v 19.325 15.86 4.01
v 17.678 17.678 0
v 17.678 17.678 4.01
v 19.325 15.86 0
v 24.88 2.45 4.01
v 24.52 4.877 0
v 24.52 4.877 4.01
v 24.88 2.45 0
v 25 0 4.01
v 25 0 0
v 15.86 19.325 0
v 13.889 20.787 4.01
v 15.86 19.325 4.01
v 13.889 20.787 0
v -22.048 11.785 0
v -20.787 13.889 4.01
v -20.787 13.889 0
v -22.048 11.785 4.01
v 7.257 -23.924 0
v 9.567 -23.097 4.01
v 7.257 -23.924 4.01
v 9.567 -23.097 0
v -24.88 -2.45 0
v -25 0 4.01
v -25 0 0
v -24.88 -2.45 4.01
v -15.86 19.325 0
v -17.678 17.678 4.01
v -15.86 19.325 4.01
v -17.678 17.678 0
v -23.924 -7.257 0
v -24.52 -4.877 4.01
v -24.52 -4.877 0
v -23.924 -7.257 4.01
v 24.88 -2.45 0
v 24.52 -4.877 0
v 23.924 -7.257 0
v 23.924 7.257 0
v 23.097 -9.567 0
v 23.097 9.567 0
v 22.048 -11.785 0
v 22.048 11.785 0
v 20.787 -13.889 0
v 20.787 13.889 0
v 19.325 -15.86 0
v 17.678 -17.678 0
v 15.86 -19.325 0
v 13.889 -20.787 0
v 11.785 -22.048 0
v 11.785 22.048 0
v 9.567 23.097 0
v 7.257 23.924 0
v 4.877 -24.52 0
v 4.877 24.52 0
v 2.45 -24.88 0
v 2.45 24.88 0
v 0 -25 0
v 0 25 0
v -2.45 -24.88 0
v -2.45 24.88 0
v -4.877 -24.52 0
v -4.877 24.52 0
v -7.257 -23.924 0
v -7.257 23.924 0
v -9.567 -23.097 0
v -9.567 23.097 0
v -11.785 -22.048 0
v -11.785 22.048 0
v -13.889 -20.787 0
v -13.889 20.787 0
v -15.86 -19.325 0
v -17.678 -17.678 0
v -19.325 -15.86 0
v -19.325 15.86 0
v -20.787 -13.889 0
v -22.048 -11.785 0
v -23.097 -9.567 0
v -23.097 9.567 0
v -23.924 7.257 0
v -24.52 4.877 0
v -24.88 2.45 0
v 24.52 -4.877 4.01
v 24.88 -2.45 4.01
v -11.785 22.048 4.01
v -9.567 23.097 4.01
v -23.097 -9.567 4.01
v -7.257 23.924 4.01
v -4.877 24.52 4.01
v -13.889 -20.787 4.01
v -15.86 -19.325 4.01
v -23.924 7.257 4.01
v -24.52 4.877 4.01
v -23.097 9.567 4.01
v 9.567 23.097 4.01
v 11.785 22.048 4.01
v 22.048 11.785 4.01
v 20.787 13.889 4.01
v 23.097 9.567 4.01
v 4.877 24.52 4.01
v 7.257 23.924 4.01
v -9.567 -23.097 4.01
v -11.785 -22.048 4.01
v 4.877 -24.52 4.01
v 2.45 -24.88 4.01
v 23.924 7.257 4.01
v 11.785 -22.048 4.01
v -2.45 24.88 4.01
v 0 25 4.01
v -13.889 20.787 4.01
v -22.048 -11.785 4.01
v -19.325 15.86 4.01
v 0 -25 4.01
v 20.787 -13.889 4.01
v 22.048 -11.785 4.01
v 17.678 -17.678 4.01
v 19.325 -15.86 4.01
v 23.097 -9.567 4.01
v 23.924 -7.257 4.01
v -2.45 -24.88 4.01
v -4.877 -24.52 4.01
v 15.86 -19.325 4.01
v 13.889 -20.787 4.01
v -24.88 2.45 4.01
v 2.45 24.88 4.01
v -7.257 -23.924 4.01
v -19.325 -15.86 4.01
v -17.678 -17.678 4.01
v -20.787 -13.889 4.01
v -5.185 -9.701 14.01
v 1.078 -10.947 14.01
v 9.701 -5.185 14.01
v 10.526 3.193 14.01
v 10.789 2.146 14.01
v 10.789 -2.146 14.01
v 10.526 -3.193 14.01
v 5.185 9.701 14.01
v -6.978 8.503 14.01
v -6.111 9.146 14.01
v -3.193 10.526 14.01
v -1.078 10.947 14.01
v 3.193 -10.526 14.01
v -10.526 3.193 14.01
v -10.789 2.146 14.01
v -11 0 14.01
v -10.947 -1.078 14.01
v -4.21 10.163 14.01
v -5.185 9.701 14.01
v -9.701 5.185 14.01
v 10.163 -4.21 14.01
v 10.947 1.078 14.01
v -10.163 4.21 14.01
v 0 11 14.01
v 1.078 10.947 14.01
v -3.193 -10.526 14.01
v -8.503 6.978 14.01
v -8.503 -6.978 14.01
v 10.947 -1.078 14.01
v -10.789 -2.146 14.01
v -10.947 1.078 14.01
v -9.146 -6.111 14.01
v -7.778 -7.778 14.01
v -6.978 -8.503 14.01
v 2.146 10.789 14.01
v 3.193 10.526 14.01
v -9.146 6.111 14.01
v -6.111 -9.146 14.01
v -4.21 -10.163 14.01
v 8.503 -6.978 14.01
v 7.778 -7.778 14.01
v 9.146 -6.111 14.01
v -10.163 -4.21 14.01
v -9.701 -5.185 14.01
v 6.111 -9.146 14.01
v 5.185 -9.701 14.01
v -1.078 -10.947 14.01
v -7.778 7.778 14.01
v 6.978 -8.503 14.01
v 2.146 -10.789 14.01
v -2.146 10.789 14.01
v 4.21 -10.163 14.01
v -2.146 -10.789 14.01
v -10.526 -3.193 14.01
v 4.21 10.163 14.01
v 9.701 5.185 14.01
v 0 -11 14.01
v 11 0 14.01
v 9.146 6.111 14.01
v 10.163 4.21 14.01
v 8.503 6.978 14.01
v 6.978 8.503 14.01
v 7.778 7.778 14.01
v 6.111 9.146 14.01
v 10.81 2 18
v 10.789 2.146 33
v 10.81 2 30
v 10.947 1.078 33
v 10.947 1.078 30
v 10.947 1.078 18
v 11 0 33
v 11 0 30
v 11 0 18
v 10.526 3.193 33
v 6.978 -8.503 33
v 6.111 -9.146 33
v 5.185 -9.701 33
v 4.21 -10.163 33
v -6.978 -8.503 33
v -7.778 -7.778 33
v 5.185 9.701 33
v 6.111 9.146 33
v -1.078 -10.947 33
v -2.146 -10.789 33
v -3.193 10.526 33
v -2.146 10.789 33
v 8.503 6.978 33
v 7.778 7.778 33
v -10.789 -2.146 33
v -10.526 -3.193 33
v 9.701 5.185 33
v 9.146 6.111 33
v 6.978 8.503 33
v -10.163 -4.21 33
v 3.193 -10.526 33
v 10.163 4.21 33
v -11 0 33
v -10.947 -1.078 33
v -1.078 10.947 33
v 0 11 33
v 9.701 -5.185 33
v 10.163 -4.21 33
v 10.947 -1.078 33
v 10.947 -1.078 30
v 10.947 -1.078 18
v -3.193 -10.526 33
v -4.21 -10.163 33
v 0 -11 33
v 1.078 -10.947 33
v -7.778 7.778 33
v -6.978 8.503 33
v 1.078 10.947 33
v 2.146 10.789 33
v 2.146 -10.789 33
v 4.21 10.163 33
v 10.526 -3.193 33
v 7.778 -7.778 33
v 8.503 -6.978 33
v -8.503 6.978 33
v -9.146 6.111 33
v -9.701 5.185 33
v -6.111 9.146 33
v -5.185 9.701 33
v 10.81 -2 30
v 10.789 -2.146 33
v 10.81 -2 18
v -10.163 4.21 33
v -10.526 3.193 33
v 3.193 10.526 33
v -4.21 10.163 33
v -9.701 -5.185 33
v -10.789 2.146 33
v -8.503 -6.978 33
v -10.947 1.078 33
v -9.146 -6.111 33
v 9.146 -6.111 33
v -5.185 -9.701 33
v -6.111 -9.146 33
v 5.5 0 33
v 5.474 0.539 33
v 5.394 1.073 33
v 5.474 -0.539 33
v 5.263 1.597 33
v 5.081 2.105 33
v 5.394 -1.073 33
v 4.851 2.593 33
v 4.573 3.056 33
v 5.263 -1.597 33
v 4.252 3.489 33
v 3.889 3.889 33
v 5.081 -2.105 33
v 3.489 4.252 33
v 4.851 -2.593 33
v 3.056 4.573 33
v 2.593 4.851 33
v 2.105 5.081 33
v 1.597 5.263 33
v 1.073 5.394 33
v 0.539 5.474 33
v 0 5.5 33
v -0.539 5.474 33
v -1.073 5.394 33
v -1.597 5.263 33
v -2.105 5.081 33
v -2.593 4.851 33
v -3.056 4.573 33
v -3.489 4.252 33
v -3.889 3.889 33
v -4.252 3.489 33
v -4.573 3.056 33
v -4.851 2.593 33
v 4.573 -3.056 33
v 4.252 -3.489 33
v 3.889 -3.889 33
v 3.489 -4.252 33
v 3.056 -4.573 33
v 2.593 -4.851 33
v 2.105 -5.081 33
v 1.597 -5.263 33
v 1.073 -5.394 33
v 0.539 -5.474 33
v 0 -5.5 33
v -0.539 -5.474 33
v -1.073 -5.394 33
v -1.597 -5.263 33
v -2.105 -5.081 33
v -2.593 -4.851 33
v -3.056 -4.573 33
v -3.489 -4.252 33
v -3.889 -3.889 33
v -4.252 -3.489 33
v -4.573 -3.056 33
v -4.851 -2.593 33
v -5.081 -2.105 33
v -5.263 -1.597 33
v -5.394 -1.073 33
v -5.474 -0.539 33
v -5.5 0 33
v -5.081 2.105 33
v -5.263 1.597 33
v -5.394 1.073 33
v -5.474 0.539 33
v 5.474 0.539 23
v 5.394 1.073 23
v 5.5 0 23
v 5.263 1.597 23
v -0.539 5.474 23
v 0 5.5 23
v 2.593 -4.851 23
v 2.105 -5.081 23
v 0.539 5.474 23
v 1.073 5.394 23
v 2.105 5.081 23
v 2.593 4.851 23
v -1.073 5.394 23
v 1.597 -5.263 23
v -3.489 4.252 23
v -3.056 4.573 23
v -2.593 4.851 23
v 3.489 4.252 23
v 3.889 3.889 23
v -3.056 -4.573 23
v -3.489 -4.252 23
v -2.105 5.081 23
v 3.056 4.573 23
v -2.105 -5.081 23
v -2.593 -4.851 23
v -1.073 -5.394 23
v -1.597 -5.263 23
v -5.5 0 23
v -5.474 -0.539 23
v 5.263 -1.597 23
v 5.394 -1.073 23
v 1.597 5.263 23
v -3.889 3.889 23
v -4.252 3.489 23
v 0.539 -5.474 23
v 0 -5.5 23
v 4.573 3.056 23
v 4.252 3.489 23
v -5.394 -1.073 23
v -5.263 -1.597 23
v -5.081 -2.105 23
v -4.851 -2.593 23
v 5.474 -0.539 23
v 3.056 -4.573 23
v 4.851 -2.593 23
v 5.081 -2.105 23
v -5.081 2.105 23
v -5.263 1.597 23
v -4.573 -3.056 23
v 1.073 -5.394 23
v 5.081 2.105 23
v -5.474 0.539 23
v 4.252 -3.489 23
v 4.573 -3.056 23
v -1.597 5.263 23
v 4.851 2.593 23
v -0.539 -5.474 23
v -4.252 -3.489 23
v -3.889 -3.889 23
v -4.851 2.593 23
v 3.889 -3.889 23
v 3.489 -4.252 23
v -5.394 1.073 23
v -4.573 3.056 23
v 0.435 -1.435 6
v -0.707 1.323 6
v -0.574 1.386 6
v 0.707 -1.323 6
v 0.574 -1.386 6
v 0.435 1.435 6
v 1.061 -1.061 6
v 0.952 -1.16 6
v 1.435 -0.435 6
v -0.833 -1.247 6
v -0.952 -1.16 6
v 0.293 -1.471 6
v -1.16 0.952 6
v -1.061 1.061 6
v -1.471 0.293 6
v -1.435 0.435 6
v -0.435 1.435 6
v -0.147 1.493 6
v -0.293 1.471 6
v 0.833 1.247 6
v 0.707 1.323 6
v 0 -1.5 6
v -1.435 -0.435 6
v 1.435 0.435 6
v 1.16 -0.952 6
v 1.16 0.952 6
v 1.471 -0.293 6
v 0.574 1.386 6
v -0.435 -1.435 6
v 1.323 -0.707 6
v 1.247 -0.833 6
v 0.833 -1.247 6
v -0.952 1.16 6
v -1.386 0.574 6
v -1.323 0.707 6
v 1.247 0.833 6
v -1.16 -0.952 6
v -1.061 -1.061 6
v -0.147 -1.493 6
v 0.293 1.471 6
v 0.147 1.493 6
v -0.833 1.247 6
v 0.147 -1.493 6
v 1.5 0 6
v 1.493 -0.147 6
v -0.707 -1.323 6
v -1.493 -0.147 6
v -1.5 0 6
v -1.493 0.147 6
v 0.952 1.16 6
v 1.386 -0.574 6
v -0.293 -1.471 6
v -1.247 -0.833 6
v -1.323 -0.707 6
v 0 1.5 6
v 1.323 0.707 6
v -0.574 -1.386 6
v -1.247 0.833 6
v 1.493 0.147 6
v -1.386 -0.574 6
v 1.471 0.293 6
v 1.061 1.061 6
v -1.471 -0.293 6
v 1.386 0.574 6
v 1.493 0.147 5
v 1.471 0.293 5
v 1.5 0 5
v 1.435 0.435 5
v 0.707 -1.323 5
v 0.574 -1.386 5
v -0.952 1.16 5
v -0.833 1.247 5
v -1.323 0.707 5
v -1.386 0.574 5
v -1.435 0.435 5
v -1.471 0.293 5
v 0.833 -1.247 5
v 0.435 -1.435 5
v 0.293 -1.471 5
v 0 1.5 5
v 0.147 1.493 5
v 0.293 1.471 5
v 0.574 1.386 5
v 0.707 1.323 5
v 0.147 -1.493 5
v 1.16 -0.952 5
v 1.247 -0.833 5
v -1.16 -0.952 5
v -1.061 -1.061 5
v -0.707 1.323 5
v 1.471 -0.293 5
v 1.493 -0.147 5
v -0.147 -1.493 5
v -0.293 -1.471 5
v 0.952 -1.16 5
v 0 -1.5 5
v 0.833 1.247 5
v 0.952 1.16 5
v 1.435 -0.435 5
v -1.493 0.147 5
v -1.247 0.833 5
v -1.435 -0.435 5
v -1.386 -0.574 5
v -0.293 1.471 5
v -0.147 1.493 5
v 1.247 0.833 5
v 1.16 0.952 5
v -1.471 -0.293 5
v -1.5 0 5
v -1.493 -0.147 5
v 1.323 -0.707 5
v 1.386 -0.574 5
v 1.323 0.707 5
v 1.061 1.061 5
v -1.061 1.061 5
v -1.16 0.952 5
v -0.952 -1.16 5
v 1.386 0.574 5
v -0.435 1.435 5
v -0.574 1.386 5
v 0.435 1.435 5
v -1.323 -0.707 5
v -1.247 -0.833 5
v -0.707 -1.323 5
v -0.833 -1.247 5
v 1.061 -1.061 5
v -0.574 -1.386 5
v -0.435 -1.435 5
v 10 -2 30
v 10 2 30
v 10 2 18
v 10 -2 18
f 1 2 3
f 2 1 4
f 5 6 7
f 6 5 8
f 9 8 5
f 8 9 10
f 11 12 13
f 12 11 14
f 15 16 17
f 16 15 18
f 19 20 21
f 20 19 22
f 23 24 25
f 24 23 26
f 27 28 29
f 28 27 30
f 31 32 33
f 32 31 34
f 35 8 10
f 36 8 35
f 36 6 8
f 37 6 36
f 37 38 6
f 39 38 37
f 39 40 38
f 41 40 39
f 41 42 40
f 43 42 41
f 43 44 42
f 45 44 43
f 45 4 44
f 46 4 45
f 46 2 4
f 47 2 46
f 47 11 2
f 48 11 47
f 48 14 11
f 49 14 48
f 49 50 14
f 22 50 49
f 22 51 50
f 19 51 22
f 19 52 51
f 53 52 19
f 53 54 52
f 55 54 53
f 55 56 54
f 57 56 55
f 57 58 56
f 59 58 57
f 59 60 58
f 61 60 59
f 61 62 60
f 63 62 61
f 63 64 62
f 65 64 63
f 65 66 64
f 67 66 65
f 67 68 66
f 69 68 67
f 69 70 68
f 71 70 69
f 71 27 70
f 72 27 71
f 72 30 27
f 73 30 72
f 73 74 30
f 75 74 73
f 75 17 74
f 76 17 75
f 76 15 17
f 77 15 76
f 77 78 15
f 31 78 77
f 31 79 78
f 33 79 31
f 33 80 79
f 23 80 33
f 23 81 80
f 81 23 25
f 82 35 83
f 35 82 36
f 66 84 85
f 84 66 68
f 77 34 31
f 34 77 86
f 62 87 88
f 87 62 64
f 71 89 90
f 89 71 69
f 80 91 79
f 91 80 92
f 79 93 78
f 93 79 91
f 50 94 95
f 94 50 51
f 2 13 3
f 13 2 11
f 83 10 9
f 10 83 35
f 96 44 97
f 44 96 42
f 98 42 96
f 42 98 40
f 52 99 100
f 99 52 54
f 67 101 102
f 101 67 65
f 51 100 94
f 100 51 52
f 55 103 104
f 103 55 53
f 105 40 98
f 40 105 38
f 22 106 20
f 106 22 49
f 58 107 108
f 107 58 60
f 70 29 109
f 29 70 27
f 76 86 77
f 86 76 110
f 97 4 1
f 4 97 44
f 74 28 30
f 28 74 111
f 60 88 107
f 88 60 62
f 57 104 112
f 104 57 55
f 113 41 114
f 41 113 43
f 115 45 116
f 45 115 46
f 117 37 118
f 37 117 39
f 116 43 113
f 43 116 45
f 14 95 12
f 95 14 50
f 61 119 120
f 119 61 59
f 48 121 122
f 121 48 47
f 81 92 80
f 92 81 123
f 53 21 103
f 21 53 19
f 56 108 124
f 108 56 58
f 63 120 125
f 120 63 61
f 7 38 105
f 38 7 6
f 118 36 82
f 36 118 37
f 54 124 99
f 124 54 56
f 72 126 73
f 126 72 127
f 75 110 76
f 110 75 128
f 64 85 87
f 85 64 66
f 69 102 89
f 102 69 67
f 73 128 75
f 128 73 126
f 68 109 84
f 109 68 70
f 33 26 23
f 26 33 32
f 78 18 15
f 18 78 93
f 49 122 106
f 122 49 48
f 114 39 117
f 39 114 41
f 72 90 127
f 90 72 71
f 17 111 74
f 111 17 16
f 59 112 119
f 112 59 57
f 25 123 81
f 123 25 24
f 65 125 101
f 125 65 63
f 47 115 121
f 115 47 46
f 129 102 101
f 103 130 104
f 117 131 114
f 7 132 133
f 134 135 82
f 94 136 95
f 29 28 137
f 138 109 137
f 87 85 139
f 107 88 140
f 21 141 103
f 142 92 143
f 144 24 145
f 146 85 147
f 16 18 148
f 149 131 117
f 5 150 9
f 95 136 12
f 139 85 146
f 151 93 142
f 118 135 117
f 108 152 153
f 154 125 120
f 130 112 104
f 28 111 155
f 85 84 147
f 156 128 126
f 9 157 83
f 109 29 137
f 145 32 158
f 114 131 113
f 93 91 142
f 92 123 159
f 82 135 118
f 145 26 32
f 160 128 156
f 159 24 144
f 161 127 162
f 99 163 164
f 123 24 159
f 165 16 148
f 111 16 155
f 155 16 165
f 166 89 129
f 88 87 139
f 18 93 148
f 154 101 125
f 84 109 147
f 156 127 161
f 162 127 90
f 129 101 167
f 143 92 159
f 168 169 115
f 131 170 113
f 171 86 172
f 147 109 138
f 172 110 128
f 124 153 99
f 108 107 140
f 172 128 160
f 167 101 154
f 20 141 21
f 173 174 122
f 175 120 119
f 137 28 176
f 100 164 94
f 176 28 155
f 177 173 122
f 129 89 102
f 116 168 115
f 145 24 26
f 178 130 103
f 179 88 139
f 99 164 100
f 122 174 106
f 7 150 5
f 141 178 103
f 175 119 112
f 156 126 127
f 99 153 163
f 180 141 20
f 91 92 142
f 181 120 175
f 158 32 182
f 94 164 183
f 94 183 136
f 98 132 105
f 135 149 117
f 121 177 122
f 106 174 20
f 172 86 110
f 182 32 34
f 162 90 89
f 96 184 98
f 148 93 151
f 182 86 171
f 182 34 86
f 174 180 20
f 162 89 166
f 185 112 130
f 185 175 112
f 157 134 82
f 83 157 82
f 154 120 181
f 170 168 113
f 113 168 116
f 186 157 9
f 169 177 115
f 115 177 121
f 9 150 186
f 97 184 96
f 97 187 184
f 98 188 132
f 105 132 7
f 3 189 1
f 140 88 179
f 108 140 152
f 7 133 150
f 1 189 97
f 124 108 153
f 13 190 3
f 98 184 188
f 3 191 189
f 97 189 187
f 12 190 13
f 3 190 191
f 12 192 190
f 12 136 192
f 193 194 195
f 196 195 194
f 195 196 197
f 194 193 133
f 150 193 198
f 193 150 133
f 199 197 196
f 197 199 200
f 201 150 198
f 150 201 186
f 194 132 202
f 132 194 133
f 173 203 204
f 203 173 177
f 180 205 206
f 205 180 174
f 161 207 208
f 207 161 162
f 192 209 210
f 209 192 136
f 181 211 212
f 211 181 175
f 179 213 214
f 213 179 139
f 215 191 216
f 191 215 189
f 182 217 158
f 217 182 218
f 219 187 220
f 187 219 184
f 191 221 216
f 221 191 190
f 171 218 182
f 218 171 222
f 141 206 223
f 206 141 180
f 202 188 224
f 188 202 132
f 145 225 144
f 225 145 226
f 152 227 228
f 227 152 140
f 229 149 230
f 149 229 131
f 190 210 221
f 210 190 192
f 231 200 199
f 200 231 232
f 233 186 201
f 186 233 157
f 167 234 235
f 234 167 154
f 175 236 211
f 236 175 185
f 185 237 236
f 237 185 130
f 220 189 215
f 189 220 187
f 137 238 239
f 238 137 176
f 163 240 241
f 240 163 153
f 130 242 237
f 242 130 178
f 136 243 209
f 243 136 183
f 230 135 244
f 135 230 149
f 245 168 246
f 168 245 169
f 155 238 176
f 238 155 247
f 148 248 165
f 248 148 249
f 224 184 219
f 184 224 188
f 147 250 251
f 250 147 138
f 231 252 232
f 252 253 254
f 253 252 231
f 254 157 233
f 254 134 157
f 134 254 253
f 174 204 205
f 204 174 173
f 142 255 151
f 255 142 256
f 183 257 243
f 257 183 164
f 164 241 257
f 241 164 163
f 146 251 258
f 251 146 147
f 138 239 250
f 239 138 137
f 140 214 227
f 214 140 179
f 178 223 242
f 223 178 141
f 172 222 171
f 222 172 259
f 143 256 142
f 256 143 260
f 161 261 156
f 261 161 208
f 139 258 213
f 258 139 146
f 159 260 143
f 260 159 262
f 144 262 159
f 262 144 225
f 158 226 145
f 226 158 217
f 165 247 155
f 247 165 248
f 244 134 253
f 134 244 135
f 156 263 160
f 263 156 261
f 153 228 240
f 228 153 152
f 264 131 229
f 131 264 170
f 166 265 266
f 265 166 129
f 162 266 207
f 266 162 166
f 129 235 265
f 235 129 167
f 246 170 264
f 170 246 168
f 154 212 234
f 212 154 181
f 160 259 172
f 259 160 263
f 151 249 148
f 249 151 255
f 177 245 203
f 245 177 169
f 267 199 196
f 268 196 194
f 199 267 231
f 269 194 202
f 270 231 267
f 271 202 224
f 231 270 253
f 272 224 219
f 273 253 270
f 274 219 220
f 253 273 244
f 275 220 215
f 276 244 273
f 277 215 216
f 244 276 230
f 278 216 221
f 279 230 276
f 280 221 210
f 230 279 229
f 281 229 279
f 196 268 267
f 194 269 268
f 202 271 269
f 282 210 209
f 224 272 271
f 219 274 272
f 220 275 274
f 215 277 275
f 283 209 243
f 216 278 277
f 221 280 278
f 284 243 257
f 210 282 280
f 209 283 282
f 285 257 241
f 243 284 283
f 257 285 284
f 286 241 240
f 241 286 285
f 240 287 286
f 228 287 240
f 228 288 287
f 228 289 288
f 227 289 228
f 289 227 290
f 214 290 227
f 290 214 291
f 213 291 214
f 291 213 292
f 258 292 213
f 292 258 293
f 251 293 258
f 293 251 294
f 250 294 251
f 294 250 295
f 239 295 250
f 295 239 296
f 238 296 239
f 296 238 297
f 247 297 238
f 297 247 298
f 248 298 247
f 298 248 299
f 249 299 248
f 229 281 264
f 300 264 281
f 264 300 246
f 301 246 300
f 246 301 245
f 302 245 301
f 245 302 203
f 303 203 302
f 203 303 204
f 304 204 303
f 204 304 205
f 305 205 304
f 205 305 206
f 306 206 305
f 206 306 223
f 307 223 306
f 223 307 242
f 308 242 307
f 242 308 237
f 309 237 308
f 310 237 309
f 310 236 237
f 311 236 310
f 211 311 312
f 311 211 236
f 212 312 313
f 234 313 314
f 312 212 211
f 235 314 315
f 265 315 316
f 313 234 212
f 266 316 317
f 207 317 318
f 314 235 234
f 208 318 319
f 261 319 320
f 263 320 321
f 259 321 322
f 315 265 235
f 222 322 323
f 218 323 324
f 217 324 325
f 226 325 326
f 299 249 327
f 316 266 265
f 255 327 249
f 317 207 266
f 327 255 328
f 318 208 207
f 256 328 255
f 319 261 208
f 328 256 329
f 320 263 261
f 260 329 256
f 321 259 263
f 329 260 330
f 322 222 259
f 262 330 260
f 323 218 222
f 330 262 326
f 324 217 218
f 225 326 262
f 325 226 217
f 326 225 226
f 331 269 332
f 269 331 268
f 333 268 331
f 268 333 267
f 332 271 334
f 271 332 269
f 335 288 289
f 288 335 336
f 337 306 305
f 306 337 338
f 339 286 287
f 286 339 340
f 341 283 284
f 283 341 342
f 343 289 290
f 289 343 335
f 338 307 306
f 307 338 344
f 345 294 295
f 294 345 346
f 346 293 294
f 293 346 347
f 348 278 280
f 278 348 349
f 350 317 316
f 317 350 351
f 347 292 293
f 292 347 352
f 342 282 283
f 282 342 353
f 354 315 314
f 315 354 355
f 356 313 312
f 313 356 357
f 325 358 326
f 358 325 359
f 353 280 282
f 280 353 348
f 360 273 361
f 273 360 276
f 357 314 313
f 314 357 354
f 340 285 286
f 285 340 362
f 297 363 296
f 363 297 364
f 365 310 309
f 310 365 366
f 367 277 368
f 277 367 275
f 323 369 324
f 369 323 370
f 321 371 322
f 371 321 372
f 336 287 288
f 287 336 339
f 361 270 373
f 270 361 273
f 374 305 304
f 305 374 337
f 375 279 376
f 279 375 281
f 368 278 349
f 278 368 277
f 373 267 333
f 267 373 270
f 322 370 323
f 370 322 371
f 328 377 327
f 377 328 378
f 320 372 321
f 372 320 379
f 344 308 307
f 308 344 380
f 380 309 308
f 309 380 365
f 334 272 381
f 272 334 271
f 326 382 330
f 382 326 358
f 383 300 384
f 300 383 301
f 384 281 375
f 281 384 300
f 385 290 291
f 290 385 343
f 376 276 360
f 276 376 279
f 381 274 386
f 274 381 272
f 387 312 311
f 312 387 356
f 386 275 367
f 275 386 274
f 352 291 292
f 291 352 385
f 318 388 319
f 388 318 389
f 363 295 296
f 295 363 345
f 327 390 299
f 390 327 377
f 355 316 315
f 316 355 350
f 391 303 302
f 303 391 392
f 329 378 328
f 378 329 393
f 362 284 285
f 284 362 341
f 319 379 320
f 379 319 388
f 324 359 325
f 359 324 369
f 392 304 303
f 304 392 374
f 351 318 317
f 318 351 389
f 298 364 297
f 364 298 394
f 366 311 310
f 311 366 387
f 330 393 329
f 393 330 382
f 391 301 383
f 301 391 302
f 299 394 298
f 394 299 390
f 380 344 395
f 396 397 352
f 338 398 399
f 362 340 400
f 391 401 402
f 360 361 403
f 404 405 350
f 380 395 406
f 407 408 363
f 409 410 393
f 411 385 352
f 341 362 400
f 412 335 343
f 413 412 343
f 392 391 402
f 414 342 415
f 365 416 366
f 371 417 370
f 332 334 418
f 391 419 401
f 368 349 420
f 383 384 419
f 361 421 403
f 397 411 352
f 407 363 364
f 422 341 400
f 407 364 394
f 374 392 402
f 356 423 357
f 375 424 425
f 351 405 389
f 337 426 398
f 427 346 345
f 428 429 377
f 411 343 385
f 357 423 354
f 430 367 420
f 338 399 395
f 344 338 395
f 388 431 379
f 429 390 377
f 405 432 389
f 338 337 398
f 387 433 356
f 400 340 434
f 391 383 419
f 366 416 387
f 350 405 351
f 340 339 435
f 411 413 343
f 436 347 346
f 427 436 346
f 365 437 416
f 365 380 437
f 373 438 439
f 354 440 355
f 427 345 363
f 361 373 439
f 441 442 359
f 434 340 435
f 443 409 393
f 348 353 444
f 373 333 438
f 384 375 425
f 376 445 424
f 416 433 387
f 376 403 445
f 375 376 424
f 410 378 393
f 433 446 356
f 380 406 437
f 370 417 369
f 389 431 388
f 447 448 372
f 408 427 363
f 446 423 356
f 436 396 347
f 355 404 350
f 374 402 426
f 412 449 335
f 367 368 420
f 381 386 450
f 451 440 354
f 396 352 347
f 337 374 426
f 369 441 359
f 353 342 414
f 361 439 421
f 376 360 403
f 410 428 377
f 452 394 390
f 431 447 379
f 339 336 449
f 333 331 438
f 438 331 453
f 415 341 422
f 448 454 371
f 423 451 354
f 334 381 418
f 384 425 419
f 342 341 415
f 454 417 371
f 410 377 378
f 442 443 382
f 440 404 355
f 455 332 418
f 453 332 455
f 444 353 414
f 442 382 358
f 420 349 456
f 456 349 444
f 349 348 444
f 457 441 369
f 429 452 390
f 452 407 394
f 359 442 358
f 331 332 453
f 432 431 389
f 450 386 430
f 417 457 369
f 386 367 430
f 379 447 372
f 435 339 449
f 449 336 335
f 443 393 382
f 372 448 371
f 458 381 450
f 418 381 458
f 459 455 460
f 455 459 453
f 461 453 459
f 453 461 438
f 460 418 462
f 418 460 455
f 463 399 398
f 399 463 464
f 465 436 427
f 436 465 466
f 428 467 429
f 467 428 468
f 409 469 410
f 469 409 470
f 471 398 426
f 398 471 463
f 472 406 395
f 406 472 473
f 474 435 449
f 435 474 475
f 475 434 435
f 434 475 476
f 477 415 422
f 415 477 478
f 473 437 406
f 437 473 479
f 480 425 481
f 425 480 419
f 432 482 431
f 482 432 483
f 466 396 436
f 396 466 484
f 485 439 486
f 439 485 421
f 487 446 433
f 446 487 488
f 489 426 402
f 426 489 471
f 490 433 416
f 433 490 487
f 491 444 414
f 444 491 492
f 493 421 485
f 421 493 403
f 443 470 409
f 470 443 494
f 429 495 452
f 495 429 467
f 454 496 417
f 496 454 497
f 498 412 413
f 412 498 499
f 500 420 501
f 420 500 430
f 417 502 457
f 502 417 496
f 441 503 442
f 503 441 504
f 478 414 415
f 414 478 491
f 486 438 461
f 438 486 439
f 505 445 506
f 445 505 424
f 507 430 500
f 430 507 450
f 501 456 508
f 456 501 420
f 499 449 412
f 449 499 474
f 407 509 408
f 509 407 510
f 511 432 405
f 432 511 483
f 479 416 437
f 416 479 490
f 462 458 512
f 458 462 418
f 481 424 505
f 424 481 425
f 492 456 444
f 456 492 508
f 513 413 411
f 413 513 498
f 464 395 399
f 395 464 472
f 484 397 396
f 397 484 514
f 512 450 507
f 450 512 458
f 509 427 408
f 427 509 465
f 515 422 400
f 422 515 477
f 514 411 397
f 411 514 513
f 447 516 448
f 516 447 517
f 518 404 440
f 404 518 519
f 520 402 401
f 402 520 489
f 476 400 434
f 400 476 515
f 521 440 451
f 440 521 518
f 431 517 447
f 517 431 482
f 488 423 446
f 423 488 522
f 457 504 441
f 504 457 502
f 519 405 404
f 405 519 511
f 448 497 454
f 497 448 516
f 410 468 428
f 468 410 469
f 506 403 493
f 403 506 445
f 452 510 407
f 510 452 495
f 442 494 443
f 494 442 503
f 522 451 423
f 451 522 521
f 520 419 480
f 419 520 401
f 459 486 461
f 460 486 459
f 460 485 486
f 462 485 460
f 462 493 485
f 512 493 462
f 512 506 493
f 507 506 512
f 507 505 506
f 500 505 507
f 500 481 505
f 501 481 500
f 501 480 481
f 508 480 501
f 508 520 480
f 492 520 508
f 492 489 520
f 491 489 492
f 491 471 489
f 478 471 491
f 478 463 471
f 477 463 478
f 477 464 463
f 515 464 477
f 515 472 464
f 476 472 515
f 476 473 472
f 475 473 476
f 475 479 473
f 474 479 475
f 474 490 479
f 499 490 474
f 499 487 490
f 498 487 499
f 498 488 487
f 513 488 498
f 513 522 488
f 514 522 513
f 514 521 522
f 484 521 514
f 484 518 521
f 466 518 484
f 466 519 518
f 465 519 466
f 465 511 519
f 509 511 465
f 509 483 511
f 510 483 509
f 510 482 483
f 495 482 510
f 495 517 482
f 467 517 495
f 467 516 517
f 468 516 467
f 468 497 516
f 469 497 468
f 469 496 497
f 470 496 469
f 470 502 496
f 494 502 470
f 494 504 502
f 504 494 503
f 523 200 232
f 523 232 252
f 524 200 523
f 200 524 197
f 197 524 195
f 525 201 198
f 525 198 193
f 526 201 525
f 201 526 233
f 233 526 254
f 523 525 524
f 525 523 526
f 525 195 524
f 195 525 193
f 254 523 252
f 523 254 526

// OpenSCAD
// --- Dimensions ---
base_diameter = 50;          // Diameter of the base disc
base_height = 4;            // Height of the base disc
cone_bottom_dia = 50;       // Diameter at the bottom of the cone (z=4)
cone_top_dia = 22;          // Diameter at the top of the cone (z=14)
cone_height = 10;           // Height of the cone section (14 - 4)
column_diameter = 22;       // Diameter of the upper column
column_height = 19;         // Height of the column (33 - 14)
total_height = 33;          // Total height of the stand

// Tube Seat Dimensions
seat_top_dia = 11;          // Diameter of the cylindrical seat
seat_top_z = 33;            // Z-coordinate at the top of the seat
seat_bottom_z = 23;         // Z-coordinate where seat becomes conical
seat_cone_bottom_dia = 3;   // Diameter at the tip of the internal cone
seat_cone_bottom_z = 6;     // Z-coordinate at the tip of the internal cone

// Viewing Window Dimensions
window_width_y = 4;         // Width of the window in Y direction
window_height_start = 18;   // Z-coordinate at bottom of window
window_height_end = 30;     // Z-coordinate at top of window
window_thickness_offset = 2; // Extra depth to ensure clean cut through walls

// --- Parameters ---
$fn = 64;

// --- Main Construction ---

difference() {
    // The Solid Body
    union() {
        // 1. Base Disc
        cylinder(d = base_diameter, h = base_height);

        // 2. Conical Section (z=4 to z=14)
        // We use hull to create the transition between the base and the column
        hull() {
            translate([0, 0, base_height])
                cylinder(d = cone_bottom_dia, h = 0.01);
            translate([0, 0, base_height + cone_height])
                cylinder(d = cone_top_dia, h = 0.01);
        }

        // 3. Upper Column (z=14 to z=33)
        translate([0, 0, base_height + cone_height])
            cylinder(d = column_diameter, h = column_height);
    }

    // --- Subtraction (Holes) ---

    // 1. The Tube Seat (Internal Cavity)
    union() {
        // Cylindrical part of the seat
        translate([0, 0, seat_bottom_z])
            cylinder(d = seat_top_dia, h = seat_top_z - seat_bottom_z + 0.1);
        
        // Conical part of the seat (follows the tube tip)
        // We use a hull between the cylinder bottom and the tip point
        hull() {
            translate([0, 0, seat_bottom_z])
                cylinder(d = seat_top_dia, h = 0.01);
            translate([0, 0, seat_cone_bottom_z])
                cylinder(d = seat_cone_bottom_dia, h = 0.01);
        }
        // Extend the cone tip slightly below z=6 to ensure clean cut
        translate([0, 0, seat_cone_bottom_z - 1])
            cylinder(d = seat_cone_bottom_dia, h = 1.1);
    }

    // 2. Viewing Window
    // Cut through the +X side. 
    // The window is 4mm wide in Y, centered on Y=0.
    // It must cut from the seat (z=18) to the outside.
    translate([column_diameter/2 - 1, -window_width_y/2, window_height_start])
        cube([window_thickness_offset + 2, window_width_y, window_height_end - window_height_start]);
}
